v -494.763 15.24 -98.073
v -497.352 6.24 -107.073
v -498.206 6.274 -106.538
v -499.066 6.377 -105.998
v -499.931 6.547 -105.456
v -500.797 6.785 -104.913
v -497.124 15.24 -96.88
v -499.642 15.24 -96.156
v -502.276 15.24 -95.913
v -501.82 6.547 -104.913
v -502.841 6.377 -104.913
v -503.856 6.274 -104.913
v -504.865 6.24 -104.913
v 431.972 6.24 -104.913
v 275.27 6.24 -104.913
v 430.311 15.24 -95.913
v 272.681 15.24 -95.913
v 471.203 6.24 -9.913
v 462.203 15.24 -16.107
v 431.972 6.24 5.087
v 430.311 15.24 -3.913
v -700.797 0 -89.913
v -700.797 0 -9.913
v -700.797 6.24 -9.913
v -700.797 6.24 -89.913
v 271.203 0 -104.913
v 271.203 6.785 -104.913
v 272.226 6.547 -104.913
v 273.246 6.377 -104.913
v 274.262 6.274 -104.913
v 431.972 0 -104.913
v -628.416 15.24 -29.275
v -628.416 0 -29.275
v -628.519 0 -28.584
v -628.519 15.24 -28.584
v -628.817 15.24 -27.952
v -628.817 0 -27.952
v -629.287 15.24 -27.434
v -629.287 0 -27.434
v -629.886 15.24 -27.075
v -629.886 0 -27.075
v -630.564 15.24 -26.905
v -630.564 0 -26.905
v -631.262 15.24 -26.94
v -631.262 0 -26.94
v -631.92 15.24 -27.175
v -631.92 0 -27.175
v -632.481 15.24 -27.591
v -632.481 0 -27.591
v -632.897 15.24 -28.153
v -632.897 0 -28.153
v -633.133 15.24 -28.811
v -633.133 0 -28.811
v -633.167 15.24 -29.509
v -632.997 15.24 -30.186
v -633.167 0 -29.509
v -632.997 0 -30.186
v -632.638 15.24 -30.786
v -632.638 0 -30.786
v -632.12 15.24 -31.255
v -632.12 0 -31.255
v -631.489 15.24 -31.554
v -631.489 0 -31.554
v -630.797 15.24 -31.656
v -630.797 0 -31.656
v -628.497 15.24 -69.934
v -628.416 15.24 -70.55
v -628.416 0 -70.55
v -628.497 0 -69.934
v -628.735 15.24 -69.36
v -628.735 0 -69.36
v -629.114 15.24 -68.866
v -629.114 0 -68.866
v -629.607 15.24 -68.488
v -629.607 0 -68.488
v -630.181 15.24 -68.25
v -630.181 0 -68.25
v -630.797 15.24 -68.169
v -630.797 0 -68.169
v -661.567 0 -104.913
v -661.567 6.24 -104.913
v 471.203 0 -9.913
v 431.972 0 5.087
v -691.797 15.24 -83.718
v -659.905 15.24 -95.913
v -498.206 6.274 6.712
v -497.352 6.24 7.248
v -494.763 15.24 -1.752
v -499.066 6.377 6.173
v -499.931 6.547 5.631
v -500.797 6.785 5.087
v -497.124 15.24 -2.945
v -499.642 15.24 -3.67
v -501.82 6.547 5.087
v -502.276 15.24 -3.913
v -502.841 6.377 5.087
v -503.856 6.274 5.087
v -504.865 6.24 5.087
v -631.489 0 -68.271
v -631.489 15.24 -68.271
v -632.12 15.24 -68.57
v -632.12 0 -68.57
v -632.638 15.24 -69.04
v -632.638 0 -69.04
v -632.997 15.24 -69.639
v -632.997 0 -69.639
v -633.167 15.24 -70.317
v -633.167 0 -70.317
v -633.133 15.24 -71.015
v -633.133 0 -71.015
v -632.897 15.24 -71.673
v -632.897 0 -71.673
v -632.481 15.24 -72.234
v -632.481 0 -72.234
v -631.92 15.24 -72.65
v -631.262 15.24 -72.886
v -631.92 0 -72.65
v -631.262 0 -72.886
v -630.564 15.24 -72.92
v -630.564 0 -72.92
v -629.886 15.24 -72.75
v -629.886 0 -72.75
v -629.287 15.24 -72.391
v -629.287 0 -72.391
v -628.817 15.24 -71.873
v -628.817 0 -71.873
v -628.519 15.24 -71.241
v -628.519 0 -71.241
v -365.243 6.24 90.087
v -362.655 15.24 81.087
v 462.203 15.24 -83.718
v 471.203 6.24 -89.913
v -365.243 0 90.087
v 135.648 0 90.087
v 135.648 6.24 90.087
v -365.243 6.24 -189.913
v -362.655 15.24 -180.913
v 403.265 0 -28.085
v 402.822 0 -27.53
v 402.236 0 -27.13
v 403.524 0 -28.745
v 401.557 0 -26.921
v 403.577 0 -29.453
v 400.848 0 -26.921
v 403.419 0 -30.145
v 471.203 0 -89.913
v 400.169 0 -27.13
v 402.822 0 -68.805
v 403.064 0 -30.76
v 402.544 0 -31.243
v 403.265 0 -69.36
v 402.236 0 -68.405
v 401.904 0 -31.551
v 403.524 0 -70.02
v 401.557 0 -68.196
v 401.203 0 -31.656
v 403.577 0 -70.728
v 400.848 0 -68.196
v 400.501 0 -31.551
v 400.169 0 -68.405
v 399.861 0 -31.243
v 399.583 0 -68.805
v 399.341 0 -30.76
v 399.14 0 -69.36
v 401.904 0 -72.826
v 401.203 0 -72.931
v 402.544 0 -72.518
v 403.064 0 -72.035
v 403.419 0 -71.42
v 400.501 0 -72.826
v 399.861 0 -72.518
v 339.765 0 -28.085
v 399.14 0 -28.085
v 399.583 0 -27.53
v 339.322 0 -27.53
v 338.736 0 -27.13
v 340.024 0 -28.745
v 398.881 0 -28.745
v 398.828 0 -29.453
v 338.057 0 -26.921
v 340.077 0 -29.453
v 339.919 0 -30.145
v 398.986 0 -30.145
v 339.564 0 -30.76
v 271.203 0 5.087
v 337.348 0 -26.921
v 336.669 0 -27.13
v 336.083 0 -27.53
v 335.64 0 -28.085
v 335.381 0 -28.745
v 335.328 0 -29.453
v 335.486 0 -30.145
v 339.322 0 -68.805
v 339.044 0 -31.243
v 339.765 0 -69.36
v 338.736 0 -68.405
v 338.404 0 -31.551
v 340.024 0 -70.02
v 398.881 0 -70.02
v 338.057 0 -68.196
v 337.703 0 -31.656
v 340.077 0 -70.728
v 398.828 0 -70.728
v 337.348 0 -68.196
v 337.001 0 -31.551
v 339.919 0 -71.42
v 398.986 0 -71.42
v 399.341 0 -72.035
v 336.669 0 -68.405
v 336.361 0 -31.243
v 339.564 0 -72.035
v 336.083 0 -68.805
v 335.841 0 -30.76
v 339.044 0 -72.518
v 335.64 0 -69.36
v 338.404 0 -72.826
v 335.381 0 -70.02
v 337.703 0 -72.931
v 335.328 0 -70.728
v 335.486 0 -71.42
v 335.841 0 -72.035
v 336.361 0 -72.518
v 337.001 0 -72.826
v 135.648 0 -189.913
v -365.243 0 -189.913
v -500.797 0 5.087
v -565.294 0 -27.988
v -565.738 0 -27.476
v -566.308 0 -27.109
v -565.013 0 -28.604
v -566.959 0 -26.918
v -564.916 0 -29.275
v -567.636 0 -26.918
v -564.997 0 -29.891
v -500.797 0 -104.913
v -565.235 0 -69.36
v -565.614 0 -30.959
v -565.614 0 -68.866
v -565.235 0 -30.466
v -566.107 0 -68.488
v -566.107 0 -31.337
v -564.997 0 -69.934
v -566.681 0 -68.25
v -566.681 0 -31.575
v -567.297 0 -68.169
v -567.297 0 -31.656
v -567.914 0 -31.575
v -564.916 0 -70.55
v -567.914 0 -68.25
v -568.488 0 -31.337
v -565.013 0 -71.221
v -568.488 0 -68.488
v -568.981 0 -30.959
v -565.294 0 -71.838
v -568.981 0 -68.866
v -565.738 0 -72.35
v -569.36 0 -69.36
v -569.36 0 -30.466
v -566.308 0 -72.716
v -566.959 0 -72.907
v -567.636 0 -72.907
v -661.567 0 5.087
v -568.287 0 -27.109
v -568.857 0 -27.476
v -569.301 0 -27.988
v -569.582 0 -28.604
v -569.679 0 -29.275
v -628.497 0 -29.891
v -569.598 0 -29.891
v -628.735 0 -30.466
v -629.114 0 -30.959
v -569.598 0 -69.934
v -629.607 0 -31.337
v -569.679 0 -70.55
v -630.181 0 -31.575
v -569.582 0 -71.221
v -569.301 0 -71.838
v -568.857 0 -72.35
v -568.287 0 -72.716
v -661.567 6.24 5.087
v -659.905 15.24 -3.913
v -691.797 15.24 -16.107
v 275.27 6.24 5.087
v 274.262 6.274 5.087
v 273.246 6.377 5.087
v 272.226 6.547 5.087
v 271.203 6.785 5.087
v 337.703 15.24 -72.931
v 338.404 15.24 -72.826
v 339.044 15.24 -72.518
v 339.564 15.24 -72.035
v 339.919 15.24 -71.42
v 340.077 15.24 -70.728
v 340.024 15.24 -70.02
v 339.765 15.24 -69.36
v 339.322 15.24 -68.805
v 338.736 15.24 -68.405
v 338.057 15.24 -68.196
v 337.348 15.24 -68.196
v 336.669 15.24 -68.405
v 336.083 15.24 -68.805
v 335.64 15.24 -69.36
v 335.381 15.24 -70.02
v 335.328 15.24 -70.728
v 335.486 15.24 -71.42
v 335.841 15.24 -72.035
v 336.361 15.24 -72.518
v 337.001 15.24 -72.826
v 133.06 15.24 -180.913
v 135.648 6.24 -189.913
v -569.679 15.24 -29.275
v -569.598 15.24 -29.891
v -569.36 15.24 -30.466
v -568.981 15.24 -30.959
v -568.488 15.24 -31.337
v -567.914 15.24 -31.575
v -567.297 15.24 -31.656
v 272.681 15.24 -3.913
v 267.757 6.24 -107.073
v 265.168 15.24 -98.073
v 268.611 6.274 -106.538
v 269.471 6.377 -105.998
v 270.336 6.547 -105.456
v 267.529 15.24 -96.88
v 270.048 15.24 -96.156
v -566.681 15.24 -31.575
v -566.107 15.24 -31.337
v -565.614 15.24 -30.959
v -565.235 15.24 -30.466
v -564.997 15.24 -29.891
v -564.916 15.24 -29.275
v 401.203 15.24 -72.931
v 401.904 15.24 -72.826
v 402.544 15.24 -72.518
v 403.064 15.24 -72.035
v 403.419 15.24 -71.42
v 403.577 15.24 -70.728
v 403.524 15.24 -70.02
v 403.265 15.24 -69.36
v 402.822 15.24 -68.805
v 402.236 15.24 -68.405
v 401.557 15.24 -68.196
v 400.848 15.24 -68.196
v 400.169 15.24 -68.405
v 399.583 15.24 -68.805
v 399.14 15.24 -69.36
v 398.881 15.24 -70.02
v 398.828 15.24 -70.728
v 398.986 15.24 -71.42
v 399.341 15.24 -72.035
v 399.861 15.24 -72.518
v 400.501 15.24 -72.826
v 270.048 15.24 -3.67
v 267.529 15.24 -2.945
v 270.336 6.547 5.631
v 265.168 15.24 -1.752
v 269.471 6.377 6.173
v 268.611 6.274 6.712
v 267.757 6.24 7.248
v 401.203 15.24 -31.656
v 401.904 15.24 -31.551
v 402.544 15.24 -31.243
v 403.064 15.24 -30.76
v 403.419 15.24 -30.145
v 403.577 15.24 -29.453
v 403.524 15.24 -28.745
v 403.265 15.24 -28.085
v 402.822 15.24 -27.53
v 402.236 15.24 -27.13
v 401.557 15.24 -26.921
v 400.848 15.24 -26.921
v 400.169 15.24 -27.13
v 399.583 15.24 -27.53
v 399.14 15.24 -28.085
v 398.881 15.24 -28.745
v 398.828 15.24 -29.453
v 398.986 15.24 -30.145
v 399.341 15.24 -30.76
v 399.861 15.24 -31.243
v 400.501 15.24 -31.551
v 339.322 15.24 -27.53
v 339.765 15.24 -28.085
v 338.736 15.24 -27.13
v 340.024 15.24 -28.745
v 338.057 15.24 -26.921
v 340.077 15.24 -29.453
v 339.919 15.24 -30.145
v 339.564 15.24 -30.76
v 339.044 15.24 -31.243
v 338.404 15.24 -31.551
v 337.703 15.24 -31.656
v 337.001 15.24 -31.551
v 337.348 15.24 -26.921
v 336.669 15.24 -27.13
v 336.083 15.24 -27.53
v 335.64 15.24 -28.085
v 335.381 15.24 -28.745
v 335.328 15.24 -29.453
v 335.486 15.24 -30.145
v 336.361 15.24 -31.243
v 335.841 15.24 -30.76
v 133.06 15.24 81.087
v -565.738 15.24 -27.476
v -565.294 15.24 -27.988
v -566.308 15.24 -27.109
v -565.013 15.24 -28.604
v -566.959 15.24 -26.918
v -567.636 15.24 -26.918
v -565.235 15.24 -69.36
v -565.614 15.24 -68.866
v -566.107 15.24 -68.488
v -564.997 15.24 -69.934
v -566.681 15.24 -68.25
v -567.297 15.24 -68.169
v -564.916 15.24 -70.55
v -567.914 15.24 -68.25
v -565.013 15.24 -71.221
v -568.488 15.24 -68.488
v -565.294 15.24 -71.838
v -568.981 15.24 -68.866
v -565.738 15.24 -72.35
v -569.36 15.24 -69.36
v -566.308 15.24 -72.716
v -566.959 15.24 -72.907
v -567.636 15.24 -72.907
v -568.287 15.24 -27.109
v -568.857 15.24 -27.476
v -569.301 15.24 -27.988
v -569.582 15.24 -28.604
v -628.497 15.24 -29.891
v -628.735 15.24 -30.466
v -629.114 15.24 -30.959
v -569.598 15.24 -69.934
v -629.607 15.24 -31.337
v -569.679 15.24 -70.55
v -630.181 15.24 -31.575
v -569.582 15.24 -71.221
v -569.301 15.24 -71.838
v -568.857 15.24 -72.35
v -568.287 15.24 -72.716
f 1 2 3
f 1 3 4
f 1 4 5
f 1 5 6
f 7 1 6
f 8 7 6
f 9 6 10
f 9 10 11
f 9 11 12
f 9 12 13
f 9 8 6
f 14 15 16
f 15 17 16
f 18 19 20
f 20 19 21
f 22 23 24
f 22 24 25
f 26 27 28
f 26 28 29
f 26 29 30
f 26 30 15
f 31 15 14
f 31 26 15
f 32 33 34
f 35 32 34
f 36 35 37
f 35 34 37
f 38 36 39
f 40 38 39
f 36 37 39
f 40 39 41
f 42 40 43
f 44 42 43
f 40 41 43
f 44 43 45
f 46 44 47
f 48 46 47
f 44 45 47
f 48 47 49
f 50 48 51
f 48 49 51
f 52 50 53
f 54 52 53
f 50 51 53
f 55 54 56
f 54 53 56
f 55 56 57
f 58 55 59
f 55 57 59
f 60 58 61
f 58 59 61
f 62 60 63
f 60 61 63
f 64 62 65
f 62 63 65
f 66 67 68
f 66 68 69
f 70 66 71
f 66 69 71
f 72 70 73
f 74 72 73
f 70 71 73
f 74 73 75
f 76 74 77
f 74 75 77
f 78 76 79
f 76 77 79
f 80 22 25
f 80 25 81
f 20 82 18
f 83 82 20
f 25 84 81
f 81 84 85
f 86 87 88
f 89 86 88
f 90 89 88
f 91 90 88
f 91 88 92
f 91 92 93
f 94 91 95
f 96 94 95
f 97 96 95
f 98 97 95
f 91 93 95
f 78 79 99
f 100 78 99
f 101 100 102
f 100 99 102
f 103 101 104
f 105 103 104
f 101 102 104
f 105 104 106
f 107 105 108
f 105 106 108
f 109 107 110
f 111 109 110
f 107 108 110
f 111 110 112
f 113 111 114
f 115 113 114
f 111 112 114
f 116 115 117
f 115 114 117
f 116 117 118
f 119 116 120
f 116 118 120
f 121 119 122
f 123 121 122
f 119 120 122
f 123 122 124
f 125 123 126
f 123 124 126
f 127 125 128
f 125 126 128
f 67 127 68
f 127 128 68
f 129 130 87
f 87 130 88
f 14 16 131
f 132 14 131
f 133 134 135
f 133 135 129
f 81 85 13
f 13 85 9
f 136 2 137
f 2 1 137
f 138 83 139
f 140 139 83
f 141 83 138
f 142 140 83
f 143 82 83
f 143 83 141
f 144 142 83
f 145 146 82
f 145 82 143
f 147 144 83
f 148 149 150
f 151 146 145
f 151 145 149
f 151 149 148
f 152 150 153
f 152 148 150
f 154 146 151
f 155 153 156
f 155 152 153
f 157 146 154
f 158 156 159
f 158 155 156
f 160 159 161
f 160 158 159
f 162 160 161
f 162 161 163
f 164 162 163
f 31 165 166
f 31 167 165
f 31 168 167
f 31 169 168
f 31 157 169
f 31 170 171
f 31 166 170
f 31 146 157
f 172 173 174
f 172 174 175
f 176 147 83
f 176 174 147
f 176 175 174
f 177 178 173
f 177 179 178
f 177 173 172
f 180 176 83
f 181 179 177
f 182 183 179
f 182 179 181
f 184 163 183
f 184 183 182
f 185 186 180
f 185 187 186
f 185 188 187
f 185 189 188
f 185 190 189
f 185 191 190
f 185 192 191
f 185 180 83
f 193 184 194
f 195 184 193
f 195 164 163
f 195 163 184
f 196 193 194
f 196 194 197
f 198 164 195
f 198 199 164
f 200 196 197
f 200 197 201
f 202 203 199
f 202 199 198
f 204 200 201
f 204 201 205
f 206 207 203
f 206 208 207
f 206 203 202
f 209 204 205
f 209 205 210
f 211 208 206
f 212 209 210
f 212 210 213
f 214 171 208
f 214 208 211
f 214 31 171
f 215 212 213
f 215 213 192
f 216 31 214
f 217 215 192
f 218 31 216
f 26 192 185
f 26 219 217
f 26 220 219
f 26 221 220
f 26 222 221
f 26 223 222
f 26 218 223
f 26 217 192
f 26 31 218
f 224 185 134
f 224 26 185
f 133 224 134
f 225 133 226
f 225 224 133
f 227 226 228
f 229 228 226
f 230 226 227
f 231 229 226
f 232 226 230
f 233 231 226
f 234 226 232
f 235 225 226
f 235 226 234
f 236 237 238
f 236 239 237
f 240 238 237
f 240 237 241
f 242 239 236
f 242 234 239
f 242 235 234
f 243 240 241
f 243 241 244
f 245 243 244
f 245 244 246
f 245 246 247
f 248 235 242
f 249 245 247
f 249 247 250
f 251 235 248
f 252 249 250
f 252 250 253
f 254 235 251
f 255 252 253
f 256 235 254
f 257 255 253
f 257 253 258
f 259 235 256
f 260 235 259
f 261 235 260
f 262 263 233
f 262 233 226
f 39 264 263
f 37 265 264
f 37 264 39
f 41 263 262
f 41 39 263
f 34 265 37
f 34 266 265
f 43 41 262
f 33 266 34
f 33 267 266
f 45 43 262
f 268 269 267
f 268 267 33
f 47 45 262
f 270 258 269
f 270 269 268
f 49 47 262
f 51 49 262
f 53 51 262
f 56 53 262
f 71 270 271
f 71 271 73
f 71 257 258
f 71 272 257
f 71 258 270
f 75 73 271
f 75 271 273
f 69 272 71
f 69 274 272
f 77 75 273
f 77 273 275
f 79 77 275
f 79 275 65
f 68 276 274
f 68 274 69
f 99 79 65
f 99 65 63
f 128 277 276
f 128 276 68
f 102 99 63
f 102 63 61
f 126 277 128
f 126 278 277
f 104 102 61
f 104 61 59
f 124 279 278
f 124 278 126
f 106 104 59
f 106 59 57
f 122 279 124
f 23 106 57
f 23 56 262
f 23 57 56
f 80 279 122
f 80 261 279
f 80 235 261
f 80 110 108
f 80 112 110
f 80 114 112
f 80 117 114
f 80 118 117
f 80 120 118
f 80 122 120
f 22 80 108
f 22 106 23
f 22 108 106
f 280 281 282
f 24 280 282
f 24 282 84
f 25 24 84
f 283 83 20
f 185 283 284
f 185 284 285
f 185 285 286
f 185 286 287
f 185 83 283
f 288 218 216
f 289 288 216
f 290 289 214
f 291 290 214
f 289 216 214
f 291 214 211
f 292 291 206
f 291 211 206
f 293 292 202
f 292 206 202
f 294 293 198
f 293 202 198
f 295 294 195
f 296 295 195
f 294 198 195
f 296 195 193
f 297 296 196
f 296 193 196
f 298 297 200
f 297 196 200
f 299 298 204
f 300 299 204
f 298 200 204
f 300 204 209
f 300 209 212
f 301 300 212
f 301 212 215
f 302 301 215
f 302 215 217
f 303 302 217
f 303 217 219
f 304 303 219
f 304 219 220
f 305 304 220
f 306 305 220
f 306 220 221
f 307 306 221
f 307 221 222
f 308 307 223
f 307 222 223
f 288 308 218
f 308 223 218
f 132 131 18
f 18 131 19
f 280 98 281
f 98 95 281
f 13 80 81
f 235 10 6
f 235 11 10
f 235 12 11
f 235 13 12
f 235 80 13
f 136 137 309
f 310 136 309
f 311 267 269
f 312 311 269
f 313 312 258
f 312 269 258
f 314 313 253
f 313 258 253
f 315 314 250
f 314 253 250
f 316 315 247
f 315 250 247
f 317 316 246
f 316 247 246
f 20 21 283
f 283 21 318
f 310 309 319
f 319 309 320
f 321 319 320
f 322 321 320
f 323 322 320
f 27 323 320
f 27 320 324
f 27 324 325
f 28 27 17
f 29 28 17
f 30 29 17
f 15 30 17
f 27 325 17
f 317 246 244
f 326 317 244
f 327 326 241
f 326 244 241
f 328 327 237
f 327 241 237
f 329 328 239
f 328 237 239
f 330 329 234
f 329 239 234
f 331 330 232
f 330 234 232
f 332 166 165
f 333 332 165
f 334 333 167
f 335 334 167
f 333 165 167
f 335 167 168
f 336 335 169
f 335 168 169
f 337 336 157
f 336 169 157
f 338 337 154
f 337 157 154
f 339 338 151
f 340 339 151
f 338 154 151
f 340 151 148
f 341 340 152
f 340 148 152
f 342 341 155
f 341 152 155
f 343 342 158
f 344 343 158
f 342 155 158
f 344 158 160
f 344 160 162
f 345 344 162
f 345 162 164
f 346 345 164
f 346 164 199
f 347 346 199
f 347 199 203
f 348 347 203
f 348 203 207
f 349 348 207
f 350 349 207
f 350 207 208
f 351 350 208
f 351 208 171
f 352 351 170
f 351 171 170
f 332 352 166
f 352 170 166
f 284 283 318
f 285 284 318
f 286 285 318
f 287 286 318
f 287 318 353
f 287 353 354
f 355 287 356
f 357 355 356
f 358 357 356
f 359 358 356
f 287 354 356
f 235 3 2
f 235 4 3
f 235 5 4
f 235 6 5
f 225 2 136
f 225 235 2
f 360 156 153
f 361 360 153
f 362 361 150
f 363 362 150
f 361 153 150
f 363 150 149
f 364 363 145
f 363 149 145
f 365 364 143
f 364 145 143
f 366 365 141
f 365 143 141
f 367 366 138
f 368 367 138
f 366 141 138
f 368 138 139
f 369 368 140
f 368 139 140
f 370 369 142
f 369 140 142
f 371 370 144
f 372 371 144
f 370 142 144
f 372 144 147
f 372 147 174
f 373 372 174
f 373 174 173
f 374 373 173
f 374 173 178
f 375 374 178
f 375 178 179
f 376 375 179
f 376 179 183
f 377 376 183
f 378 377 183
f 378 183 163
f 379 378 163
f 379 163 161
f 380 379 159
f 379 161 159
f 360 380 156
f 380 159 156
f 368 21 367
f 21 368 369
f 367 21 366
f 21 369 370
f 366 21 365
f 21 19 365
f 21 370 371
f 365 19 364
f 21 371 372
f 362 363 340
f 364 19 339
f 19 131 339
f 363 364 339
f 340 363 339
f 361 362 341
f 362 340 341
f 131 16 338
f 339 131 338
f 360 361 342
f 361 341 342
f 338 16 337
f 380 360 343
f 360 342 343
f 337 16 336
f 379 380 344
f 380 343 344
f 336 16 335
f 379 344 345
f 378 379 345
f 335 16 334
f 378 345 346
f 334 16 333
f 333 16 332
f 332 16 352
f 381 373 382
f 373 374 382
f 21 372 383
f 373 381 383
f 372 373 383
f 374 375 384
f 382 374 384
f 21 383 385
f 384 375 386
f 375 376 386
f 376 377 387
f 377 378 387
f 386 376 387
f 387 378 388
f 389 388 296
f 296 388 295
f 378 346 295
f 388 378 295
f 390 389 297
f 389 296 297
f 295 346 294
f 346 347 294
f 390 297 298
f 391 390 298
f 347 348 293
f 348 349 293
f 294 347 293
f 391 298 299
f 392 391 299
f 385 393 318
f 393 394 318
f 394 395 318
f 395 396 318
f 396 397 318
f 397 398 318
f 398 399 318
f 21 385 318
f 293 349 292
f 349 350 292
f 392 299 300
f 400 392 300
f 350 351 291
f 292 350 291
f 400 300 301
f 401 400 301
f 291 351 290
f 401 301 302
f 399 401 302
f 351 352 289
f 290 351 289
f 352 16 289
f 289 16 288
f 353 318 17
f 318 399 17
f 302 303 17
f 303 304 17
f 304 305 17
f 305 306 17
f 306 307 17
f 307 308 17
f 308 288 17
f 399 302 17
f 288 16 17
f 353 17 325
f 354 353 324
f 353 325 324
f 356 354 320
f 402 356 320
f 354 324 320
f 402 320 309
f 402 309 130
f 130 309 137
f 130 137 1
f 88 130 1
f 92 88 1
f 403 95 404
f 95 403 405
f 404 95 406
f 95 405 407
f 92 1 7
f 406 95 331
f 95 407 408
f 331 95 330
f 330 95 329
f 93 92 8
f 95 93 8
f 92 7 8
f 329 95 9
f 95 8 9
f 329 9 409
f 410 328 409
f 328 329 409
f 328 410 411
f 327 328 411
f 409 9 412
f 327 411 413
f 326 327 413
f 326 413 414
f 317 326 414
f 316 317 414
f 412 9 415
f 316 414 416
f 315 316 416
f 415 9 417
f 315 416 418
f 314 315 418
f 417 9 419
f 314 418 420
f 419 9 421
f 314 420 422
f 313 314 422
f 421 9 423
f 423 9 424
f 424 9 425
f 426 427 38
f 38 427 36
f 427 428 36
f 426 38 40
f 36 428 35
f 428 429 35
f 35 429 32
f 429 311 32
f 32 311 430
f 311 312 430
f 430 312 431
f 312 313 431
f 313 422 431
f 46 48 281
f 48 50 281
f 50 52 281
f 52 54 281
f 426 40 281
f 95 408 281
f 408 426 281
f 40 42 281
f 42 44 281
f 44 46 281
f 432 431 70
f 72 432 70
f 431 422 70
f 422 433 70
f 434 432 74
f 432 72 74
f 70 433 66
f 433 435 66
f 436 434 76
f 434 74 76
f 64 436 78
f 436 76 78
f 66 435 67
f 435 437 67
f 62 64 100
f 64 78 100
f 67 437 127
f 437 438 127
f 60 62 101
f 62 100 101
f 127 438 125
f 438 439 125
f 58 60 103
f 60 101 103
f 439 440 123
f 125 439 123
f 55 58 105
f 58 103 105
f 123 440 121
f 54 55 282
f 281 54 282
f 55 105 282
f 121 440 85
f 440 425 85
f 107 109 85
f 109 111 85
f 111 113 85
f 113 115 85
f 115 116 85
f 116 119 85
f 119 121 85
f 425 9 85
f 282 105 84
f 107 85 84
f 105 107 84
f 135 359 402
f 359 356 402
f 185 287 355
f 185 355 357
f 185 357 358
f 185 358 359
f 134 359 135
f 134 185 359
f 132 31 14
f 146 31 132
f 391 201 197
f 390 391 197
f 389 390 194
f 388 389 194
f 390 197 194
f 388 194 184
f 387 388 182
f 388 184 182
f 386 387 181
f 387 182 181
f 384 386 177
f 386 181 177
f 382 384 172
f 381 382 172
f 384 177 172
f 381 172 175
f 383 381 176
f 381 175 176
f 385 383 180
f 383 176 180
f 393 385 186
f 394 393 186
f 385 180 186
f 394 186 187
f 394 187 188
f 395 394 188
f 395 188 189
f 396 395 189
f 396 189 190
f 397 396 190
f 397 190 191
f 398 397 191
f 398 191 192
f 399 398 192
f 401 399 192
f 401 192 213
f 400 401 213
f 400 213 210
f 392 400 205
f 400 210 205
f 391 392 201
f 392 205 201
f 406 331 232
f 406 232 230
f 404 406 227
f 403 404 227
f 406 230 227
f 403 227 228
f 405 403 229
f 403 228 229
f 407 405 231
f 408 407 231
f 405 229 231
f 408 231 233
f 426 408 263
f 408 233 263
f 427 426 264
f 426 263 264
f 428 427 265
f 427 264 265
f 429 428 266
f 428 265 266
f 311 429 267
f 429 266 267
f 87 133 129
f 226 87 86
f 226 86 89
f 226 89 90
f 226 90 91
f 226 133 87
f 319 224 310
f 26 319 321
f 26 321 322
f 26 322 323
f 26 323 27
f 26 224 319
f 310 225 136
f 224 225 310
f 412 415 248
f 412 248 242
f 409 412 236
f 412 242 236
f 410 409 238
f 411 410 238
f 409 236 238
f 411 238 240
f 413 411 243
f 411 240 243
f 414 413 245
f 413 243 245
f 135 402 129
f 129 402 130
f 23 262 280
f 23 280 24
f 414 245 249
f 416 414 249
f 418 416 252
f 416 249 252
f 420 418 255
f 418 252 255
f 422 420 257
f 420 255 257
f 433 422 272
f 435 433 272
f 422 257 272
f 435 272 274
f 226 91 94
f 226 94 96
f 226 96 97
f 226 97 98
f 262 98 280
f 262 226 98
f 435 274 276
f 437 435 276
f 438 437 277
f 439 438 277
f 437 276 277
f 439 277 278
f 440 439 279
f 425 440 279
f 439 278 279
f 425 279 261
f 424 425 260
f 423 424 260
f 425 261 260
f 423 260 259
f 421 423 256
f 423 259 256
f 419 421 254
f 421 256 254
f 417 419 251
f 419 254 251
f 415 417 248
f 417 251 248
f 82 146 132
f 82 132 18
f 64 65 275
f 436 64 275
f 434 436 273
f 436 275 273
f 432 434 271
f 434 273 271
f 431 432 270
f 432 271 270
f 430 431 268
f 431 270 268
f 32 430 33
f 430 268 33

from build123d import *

# Parameters (mm, degrees)
BOSS_EXTRUDE1_DEPTH = 15.24
CHAMFER1_SIZE       = 9
FILLET1_R           = 20
SKETCH2_R           = 2.38125
CUT_EXTRUDE1_DEPTH  = 15.24


with BuildPart() as part:
    # Sketch1 → Boss-Extrude1 (new body)
    with BuildSketch(Plane(origin=(0, 0, 0), x_dir=(1, 0, 0), z_dir=(0, 1, 0))):
        Polygon((-365.243004426, 189.912666736), (135.648161339, 189.912666736), (271.202578456, 104.912666736), (431.972487964, 104.912666736), (471.202578456, 89.912666736), (471.202578456, 9.912666736), (431.972487964, -5.087333264), (271.202578456, -5.087333264), (135.648161339, -90.087333264), (-365.243004426, -90.087333264), (-500.797421544, -5.087333264), (-661.567331052, -5.087333264), (-700.797421544, 9.912666736), (-700.797421544, 89.912666736), (-661.567331052, 104.912666736), (-500.797421544, 104.912666736), align=None)
    extrude(amount=BOSS_EXTRUDE1_DEPTH)

    # Chamfer1
    chamfer1_edges = [part.edges().sort_by_distance(p)[0] for p in [
        (451.58753321, 15.24, -2.412666736),
        (471.202578456, 15.24, -49.912666736),
        (451.58753321, 15.24, -97.412666736),
        (351.58753321, 15.24, -104.912666736),
        (203.425369898, 15.24, -147.412666736),
        (-114.797421544, 15.24, -189.912666736),
        (-433.020212985, 15.24, -147.412666736),
        (-581.182376298, 15.24, -104.912666736),
        (-681.182376298, 15.24, -97.412666736),
        (-700.797421544, 15.24, -49.912666736),
        (203.425369898, 15.24, 47.587333264),
        (-681.182376298, 15.24, -2.412666736),
        (-581.182376298, 15.24, 5.087333264),
        (-433.020212985, 15.24, 47.587333264),
        (-114.797421544, 15.24, 90.087333264),
        (351.58753321, 15.24, 5.087333264),
    ]]
    chamfer(chamfer1_edges, length=CHAMFER1_SIZE)

    # Fillet1
    fillet1_edges = [part.edges().sort_by_distance(p)[0] for p in [
        (269.908400539, 10.74, 0.587333264),
        (-499.503243626, 10.74, 0.587333264),
        (269.908400539, 10.74, -100.412666736),
        (-499.503243626, 10.74, -100.412666736),
    ]]
    fillet(fillet1_edges, radius=FILLET1_R)

    # Sketch2 → Cut-Extrude1 (cut)
    with BuildSketch(Plane.XZ):
        with BuildLine():
            ThreePointArc((-628.416171544, -70.550166736), (-629.113623521, -68.866368714), (-630.797421544, -68.168916736))
            Line((-630.797421544, -68.168916736), (-630.797421544, -70.550166736))
            Line((-630.797421544, -70.550166736), (-628.416171544, -70.550166736))
        make_face()
        with BuildLine():
            Line((-630.797421544, -70.550166736), (-630.797421544, -68.168916736))
            ThreePointArc((-630.797421544, -68.168916736), (-632.481219566, -72.233964759), (-628.416171544, -70.550166736))
            Line((-628.416171544, -70.550166736), (-630.797421544, -70.550166736))
        make_face()
        with BuildLine():
            Line((-630.797421544, -31.656416736), (-630.797421544, -29.275166736))
            Line((-630.797421544, -29.275166736), (-628.416171544, -29.275166736))
            ThreePointArc((-628.416171544, -29.275166736), (-632.481219566, -27.591368714), (-630.797421544, -31.656416736))
        make_face()
        with BuildLine():
            Line((-628.416171544, -29.275166736), (-630.797421544, -29.275166736))
            Line((-630.797421544, -29.275166736), (-630.797421544, -31.656416736))
            ThreePointArc((-630.797421544, -31.656416736), (-629.113623521, -30.958964759), (-628.416171544, -29.275166736))
        make_face()
        with BuildLine():
            ThreePointArc((-564.916171544, -29.275166736), (-567.297421544, -26.893916736), (-569.678671544, -29.275166736))
            Line((-569.678671544, -29.275166736), (-567.297421544, -29.275166736))
            Line((-567.297421544, -29.275166736), (-567.297421544, -31.656416736))
            ThreePointArc((-567.297421544, -31.656416736), (-565.613623521, -30.958964759), (-564.916171544, -29.275166736))
        make_face()
        with BuildLine():
            Line((-567.297421544, -29.275166736), (-569.678671544, -29.275166736))
            ThreePointArc((-569.678671544, -29.275166736), (-568.981219566, -30.958964759), (-567.297421544, -31.656416736))
            Line((-567.297421544, -31.656416736), (-567.297421544, -29.275166736))
        make_face()
        with BuildLine():
            ThreePointArc((-564.916171544, -70.550166736), (-565.613623521, -68.866368714), (-567.297421544, -68.168916736))
            Line((-567.297421544, -68.168916736), (-567.297421544, -70.550166736))
            Line((-567.297421544, -70.550166736), (-569.678671544, -70.550166736))
            ThreePointArc((-569.678671544, -70.550166736), (-567.297421544, -72.931416736), (-564.916171544, -70.550166736))
        make_face()
        with BuildLine():
            Line((-567.297421544, -70.550166736), (-567.297421544, -68.168916736))
            ThreePointArc((-567.297421544, -68.168916736), (-568.981219566, -68.866368714), (-569.678671544, -70.550166736))
            Line((-569.678671544, -70.550166736), (-567.297421544, -70.550166736))
        make_face()
        with Locations(Location((337.702578456, -70.550166736, 0), (0, 0, 270))):
            Circle(SKETCH2_R)
        with Locations(Location((337.702578456, -29.275166736, 0), (0, 0, 270))):
            Circle(SKETCH2_R)
        with Locations(Location((401.202578456, -29.275166736, 0), (0, 0, 270))):
            Circle(SKETCH2_R)
        with Locations(Location((401.202578456, -70.550166736, 0), (0, 0, 270))):
            Circle(SKETCH2_R)
    extrude(amount=-CUT_EXTRUDE1_DEPTH, mode=Mode.SUBTRACT)


solid = part.part
